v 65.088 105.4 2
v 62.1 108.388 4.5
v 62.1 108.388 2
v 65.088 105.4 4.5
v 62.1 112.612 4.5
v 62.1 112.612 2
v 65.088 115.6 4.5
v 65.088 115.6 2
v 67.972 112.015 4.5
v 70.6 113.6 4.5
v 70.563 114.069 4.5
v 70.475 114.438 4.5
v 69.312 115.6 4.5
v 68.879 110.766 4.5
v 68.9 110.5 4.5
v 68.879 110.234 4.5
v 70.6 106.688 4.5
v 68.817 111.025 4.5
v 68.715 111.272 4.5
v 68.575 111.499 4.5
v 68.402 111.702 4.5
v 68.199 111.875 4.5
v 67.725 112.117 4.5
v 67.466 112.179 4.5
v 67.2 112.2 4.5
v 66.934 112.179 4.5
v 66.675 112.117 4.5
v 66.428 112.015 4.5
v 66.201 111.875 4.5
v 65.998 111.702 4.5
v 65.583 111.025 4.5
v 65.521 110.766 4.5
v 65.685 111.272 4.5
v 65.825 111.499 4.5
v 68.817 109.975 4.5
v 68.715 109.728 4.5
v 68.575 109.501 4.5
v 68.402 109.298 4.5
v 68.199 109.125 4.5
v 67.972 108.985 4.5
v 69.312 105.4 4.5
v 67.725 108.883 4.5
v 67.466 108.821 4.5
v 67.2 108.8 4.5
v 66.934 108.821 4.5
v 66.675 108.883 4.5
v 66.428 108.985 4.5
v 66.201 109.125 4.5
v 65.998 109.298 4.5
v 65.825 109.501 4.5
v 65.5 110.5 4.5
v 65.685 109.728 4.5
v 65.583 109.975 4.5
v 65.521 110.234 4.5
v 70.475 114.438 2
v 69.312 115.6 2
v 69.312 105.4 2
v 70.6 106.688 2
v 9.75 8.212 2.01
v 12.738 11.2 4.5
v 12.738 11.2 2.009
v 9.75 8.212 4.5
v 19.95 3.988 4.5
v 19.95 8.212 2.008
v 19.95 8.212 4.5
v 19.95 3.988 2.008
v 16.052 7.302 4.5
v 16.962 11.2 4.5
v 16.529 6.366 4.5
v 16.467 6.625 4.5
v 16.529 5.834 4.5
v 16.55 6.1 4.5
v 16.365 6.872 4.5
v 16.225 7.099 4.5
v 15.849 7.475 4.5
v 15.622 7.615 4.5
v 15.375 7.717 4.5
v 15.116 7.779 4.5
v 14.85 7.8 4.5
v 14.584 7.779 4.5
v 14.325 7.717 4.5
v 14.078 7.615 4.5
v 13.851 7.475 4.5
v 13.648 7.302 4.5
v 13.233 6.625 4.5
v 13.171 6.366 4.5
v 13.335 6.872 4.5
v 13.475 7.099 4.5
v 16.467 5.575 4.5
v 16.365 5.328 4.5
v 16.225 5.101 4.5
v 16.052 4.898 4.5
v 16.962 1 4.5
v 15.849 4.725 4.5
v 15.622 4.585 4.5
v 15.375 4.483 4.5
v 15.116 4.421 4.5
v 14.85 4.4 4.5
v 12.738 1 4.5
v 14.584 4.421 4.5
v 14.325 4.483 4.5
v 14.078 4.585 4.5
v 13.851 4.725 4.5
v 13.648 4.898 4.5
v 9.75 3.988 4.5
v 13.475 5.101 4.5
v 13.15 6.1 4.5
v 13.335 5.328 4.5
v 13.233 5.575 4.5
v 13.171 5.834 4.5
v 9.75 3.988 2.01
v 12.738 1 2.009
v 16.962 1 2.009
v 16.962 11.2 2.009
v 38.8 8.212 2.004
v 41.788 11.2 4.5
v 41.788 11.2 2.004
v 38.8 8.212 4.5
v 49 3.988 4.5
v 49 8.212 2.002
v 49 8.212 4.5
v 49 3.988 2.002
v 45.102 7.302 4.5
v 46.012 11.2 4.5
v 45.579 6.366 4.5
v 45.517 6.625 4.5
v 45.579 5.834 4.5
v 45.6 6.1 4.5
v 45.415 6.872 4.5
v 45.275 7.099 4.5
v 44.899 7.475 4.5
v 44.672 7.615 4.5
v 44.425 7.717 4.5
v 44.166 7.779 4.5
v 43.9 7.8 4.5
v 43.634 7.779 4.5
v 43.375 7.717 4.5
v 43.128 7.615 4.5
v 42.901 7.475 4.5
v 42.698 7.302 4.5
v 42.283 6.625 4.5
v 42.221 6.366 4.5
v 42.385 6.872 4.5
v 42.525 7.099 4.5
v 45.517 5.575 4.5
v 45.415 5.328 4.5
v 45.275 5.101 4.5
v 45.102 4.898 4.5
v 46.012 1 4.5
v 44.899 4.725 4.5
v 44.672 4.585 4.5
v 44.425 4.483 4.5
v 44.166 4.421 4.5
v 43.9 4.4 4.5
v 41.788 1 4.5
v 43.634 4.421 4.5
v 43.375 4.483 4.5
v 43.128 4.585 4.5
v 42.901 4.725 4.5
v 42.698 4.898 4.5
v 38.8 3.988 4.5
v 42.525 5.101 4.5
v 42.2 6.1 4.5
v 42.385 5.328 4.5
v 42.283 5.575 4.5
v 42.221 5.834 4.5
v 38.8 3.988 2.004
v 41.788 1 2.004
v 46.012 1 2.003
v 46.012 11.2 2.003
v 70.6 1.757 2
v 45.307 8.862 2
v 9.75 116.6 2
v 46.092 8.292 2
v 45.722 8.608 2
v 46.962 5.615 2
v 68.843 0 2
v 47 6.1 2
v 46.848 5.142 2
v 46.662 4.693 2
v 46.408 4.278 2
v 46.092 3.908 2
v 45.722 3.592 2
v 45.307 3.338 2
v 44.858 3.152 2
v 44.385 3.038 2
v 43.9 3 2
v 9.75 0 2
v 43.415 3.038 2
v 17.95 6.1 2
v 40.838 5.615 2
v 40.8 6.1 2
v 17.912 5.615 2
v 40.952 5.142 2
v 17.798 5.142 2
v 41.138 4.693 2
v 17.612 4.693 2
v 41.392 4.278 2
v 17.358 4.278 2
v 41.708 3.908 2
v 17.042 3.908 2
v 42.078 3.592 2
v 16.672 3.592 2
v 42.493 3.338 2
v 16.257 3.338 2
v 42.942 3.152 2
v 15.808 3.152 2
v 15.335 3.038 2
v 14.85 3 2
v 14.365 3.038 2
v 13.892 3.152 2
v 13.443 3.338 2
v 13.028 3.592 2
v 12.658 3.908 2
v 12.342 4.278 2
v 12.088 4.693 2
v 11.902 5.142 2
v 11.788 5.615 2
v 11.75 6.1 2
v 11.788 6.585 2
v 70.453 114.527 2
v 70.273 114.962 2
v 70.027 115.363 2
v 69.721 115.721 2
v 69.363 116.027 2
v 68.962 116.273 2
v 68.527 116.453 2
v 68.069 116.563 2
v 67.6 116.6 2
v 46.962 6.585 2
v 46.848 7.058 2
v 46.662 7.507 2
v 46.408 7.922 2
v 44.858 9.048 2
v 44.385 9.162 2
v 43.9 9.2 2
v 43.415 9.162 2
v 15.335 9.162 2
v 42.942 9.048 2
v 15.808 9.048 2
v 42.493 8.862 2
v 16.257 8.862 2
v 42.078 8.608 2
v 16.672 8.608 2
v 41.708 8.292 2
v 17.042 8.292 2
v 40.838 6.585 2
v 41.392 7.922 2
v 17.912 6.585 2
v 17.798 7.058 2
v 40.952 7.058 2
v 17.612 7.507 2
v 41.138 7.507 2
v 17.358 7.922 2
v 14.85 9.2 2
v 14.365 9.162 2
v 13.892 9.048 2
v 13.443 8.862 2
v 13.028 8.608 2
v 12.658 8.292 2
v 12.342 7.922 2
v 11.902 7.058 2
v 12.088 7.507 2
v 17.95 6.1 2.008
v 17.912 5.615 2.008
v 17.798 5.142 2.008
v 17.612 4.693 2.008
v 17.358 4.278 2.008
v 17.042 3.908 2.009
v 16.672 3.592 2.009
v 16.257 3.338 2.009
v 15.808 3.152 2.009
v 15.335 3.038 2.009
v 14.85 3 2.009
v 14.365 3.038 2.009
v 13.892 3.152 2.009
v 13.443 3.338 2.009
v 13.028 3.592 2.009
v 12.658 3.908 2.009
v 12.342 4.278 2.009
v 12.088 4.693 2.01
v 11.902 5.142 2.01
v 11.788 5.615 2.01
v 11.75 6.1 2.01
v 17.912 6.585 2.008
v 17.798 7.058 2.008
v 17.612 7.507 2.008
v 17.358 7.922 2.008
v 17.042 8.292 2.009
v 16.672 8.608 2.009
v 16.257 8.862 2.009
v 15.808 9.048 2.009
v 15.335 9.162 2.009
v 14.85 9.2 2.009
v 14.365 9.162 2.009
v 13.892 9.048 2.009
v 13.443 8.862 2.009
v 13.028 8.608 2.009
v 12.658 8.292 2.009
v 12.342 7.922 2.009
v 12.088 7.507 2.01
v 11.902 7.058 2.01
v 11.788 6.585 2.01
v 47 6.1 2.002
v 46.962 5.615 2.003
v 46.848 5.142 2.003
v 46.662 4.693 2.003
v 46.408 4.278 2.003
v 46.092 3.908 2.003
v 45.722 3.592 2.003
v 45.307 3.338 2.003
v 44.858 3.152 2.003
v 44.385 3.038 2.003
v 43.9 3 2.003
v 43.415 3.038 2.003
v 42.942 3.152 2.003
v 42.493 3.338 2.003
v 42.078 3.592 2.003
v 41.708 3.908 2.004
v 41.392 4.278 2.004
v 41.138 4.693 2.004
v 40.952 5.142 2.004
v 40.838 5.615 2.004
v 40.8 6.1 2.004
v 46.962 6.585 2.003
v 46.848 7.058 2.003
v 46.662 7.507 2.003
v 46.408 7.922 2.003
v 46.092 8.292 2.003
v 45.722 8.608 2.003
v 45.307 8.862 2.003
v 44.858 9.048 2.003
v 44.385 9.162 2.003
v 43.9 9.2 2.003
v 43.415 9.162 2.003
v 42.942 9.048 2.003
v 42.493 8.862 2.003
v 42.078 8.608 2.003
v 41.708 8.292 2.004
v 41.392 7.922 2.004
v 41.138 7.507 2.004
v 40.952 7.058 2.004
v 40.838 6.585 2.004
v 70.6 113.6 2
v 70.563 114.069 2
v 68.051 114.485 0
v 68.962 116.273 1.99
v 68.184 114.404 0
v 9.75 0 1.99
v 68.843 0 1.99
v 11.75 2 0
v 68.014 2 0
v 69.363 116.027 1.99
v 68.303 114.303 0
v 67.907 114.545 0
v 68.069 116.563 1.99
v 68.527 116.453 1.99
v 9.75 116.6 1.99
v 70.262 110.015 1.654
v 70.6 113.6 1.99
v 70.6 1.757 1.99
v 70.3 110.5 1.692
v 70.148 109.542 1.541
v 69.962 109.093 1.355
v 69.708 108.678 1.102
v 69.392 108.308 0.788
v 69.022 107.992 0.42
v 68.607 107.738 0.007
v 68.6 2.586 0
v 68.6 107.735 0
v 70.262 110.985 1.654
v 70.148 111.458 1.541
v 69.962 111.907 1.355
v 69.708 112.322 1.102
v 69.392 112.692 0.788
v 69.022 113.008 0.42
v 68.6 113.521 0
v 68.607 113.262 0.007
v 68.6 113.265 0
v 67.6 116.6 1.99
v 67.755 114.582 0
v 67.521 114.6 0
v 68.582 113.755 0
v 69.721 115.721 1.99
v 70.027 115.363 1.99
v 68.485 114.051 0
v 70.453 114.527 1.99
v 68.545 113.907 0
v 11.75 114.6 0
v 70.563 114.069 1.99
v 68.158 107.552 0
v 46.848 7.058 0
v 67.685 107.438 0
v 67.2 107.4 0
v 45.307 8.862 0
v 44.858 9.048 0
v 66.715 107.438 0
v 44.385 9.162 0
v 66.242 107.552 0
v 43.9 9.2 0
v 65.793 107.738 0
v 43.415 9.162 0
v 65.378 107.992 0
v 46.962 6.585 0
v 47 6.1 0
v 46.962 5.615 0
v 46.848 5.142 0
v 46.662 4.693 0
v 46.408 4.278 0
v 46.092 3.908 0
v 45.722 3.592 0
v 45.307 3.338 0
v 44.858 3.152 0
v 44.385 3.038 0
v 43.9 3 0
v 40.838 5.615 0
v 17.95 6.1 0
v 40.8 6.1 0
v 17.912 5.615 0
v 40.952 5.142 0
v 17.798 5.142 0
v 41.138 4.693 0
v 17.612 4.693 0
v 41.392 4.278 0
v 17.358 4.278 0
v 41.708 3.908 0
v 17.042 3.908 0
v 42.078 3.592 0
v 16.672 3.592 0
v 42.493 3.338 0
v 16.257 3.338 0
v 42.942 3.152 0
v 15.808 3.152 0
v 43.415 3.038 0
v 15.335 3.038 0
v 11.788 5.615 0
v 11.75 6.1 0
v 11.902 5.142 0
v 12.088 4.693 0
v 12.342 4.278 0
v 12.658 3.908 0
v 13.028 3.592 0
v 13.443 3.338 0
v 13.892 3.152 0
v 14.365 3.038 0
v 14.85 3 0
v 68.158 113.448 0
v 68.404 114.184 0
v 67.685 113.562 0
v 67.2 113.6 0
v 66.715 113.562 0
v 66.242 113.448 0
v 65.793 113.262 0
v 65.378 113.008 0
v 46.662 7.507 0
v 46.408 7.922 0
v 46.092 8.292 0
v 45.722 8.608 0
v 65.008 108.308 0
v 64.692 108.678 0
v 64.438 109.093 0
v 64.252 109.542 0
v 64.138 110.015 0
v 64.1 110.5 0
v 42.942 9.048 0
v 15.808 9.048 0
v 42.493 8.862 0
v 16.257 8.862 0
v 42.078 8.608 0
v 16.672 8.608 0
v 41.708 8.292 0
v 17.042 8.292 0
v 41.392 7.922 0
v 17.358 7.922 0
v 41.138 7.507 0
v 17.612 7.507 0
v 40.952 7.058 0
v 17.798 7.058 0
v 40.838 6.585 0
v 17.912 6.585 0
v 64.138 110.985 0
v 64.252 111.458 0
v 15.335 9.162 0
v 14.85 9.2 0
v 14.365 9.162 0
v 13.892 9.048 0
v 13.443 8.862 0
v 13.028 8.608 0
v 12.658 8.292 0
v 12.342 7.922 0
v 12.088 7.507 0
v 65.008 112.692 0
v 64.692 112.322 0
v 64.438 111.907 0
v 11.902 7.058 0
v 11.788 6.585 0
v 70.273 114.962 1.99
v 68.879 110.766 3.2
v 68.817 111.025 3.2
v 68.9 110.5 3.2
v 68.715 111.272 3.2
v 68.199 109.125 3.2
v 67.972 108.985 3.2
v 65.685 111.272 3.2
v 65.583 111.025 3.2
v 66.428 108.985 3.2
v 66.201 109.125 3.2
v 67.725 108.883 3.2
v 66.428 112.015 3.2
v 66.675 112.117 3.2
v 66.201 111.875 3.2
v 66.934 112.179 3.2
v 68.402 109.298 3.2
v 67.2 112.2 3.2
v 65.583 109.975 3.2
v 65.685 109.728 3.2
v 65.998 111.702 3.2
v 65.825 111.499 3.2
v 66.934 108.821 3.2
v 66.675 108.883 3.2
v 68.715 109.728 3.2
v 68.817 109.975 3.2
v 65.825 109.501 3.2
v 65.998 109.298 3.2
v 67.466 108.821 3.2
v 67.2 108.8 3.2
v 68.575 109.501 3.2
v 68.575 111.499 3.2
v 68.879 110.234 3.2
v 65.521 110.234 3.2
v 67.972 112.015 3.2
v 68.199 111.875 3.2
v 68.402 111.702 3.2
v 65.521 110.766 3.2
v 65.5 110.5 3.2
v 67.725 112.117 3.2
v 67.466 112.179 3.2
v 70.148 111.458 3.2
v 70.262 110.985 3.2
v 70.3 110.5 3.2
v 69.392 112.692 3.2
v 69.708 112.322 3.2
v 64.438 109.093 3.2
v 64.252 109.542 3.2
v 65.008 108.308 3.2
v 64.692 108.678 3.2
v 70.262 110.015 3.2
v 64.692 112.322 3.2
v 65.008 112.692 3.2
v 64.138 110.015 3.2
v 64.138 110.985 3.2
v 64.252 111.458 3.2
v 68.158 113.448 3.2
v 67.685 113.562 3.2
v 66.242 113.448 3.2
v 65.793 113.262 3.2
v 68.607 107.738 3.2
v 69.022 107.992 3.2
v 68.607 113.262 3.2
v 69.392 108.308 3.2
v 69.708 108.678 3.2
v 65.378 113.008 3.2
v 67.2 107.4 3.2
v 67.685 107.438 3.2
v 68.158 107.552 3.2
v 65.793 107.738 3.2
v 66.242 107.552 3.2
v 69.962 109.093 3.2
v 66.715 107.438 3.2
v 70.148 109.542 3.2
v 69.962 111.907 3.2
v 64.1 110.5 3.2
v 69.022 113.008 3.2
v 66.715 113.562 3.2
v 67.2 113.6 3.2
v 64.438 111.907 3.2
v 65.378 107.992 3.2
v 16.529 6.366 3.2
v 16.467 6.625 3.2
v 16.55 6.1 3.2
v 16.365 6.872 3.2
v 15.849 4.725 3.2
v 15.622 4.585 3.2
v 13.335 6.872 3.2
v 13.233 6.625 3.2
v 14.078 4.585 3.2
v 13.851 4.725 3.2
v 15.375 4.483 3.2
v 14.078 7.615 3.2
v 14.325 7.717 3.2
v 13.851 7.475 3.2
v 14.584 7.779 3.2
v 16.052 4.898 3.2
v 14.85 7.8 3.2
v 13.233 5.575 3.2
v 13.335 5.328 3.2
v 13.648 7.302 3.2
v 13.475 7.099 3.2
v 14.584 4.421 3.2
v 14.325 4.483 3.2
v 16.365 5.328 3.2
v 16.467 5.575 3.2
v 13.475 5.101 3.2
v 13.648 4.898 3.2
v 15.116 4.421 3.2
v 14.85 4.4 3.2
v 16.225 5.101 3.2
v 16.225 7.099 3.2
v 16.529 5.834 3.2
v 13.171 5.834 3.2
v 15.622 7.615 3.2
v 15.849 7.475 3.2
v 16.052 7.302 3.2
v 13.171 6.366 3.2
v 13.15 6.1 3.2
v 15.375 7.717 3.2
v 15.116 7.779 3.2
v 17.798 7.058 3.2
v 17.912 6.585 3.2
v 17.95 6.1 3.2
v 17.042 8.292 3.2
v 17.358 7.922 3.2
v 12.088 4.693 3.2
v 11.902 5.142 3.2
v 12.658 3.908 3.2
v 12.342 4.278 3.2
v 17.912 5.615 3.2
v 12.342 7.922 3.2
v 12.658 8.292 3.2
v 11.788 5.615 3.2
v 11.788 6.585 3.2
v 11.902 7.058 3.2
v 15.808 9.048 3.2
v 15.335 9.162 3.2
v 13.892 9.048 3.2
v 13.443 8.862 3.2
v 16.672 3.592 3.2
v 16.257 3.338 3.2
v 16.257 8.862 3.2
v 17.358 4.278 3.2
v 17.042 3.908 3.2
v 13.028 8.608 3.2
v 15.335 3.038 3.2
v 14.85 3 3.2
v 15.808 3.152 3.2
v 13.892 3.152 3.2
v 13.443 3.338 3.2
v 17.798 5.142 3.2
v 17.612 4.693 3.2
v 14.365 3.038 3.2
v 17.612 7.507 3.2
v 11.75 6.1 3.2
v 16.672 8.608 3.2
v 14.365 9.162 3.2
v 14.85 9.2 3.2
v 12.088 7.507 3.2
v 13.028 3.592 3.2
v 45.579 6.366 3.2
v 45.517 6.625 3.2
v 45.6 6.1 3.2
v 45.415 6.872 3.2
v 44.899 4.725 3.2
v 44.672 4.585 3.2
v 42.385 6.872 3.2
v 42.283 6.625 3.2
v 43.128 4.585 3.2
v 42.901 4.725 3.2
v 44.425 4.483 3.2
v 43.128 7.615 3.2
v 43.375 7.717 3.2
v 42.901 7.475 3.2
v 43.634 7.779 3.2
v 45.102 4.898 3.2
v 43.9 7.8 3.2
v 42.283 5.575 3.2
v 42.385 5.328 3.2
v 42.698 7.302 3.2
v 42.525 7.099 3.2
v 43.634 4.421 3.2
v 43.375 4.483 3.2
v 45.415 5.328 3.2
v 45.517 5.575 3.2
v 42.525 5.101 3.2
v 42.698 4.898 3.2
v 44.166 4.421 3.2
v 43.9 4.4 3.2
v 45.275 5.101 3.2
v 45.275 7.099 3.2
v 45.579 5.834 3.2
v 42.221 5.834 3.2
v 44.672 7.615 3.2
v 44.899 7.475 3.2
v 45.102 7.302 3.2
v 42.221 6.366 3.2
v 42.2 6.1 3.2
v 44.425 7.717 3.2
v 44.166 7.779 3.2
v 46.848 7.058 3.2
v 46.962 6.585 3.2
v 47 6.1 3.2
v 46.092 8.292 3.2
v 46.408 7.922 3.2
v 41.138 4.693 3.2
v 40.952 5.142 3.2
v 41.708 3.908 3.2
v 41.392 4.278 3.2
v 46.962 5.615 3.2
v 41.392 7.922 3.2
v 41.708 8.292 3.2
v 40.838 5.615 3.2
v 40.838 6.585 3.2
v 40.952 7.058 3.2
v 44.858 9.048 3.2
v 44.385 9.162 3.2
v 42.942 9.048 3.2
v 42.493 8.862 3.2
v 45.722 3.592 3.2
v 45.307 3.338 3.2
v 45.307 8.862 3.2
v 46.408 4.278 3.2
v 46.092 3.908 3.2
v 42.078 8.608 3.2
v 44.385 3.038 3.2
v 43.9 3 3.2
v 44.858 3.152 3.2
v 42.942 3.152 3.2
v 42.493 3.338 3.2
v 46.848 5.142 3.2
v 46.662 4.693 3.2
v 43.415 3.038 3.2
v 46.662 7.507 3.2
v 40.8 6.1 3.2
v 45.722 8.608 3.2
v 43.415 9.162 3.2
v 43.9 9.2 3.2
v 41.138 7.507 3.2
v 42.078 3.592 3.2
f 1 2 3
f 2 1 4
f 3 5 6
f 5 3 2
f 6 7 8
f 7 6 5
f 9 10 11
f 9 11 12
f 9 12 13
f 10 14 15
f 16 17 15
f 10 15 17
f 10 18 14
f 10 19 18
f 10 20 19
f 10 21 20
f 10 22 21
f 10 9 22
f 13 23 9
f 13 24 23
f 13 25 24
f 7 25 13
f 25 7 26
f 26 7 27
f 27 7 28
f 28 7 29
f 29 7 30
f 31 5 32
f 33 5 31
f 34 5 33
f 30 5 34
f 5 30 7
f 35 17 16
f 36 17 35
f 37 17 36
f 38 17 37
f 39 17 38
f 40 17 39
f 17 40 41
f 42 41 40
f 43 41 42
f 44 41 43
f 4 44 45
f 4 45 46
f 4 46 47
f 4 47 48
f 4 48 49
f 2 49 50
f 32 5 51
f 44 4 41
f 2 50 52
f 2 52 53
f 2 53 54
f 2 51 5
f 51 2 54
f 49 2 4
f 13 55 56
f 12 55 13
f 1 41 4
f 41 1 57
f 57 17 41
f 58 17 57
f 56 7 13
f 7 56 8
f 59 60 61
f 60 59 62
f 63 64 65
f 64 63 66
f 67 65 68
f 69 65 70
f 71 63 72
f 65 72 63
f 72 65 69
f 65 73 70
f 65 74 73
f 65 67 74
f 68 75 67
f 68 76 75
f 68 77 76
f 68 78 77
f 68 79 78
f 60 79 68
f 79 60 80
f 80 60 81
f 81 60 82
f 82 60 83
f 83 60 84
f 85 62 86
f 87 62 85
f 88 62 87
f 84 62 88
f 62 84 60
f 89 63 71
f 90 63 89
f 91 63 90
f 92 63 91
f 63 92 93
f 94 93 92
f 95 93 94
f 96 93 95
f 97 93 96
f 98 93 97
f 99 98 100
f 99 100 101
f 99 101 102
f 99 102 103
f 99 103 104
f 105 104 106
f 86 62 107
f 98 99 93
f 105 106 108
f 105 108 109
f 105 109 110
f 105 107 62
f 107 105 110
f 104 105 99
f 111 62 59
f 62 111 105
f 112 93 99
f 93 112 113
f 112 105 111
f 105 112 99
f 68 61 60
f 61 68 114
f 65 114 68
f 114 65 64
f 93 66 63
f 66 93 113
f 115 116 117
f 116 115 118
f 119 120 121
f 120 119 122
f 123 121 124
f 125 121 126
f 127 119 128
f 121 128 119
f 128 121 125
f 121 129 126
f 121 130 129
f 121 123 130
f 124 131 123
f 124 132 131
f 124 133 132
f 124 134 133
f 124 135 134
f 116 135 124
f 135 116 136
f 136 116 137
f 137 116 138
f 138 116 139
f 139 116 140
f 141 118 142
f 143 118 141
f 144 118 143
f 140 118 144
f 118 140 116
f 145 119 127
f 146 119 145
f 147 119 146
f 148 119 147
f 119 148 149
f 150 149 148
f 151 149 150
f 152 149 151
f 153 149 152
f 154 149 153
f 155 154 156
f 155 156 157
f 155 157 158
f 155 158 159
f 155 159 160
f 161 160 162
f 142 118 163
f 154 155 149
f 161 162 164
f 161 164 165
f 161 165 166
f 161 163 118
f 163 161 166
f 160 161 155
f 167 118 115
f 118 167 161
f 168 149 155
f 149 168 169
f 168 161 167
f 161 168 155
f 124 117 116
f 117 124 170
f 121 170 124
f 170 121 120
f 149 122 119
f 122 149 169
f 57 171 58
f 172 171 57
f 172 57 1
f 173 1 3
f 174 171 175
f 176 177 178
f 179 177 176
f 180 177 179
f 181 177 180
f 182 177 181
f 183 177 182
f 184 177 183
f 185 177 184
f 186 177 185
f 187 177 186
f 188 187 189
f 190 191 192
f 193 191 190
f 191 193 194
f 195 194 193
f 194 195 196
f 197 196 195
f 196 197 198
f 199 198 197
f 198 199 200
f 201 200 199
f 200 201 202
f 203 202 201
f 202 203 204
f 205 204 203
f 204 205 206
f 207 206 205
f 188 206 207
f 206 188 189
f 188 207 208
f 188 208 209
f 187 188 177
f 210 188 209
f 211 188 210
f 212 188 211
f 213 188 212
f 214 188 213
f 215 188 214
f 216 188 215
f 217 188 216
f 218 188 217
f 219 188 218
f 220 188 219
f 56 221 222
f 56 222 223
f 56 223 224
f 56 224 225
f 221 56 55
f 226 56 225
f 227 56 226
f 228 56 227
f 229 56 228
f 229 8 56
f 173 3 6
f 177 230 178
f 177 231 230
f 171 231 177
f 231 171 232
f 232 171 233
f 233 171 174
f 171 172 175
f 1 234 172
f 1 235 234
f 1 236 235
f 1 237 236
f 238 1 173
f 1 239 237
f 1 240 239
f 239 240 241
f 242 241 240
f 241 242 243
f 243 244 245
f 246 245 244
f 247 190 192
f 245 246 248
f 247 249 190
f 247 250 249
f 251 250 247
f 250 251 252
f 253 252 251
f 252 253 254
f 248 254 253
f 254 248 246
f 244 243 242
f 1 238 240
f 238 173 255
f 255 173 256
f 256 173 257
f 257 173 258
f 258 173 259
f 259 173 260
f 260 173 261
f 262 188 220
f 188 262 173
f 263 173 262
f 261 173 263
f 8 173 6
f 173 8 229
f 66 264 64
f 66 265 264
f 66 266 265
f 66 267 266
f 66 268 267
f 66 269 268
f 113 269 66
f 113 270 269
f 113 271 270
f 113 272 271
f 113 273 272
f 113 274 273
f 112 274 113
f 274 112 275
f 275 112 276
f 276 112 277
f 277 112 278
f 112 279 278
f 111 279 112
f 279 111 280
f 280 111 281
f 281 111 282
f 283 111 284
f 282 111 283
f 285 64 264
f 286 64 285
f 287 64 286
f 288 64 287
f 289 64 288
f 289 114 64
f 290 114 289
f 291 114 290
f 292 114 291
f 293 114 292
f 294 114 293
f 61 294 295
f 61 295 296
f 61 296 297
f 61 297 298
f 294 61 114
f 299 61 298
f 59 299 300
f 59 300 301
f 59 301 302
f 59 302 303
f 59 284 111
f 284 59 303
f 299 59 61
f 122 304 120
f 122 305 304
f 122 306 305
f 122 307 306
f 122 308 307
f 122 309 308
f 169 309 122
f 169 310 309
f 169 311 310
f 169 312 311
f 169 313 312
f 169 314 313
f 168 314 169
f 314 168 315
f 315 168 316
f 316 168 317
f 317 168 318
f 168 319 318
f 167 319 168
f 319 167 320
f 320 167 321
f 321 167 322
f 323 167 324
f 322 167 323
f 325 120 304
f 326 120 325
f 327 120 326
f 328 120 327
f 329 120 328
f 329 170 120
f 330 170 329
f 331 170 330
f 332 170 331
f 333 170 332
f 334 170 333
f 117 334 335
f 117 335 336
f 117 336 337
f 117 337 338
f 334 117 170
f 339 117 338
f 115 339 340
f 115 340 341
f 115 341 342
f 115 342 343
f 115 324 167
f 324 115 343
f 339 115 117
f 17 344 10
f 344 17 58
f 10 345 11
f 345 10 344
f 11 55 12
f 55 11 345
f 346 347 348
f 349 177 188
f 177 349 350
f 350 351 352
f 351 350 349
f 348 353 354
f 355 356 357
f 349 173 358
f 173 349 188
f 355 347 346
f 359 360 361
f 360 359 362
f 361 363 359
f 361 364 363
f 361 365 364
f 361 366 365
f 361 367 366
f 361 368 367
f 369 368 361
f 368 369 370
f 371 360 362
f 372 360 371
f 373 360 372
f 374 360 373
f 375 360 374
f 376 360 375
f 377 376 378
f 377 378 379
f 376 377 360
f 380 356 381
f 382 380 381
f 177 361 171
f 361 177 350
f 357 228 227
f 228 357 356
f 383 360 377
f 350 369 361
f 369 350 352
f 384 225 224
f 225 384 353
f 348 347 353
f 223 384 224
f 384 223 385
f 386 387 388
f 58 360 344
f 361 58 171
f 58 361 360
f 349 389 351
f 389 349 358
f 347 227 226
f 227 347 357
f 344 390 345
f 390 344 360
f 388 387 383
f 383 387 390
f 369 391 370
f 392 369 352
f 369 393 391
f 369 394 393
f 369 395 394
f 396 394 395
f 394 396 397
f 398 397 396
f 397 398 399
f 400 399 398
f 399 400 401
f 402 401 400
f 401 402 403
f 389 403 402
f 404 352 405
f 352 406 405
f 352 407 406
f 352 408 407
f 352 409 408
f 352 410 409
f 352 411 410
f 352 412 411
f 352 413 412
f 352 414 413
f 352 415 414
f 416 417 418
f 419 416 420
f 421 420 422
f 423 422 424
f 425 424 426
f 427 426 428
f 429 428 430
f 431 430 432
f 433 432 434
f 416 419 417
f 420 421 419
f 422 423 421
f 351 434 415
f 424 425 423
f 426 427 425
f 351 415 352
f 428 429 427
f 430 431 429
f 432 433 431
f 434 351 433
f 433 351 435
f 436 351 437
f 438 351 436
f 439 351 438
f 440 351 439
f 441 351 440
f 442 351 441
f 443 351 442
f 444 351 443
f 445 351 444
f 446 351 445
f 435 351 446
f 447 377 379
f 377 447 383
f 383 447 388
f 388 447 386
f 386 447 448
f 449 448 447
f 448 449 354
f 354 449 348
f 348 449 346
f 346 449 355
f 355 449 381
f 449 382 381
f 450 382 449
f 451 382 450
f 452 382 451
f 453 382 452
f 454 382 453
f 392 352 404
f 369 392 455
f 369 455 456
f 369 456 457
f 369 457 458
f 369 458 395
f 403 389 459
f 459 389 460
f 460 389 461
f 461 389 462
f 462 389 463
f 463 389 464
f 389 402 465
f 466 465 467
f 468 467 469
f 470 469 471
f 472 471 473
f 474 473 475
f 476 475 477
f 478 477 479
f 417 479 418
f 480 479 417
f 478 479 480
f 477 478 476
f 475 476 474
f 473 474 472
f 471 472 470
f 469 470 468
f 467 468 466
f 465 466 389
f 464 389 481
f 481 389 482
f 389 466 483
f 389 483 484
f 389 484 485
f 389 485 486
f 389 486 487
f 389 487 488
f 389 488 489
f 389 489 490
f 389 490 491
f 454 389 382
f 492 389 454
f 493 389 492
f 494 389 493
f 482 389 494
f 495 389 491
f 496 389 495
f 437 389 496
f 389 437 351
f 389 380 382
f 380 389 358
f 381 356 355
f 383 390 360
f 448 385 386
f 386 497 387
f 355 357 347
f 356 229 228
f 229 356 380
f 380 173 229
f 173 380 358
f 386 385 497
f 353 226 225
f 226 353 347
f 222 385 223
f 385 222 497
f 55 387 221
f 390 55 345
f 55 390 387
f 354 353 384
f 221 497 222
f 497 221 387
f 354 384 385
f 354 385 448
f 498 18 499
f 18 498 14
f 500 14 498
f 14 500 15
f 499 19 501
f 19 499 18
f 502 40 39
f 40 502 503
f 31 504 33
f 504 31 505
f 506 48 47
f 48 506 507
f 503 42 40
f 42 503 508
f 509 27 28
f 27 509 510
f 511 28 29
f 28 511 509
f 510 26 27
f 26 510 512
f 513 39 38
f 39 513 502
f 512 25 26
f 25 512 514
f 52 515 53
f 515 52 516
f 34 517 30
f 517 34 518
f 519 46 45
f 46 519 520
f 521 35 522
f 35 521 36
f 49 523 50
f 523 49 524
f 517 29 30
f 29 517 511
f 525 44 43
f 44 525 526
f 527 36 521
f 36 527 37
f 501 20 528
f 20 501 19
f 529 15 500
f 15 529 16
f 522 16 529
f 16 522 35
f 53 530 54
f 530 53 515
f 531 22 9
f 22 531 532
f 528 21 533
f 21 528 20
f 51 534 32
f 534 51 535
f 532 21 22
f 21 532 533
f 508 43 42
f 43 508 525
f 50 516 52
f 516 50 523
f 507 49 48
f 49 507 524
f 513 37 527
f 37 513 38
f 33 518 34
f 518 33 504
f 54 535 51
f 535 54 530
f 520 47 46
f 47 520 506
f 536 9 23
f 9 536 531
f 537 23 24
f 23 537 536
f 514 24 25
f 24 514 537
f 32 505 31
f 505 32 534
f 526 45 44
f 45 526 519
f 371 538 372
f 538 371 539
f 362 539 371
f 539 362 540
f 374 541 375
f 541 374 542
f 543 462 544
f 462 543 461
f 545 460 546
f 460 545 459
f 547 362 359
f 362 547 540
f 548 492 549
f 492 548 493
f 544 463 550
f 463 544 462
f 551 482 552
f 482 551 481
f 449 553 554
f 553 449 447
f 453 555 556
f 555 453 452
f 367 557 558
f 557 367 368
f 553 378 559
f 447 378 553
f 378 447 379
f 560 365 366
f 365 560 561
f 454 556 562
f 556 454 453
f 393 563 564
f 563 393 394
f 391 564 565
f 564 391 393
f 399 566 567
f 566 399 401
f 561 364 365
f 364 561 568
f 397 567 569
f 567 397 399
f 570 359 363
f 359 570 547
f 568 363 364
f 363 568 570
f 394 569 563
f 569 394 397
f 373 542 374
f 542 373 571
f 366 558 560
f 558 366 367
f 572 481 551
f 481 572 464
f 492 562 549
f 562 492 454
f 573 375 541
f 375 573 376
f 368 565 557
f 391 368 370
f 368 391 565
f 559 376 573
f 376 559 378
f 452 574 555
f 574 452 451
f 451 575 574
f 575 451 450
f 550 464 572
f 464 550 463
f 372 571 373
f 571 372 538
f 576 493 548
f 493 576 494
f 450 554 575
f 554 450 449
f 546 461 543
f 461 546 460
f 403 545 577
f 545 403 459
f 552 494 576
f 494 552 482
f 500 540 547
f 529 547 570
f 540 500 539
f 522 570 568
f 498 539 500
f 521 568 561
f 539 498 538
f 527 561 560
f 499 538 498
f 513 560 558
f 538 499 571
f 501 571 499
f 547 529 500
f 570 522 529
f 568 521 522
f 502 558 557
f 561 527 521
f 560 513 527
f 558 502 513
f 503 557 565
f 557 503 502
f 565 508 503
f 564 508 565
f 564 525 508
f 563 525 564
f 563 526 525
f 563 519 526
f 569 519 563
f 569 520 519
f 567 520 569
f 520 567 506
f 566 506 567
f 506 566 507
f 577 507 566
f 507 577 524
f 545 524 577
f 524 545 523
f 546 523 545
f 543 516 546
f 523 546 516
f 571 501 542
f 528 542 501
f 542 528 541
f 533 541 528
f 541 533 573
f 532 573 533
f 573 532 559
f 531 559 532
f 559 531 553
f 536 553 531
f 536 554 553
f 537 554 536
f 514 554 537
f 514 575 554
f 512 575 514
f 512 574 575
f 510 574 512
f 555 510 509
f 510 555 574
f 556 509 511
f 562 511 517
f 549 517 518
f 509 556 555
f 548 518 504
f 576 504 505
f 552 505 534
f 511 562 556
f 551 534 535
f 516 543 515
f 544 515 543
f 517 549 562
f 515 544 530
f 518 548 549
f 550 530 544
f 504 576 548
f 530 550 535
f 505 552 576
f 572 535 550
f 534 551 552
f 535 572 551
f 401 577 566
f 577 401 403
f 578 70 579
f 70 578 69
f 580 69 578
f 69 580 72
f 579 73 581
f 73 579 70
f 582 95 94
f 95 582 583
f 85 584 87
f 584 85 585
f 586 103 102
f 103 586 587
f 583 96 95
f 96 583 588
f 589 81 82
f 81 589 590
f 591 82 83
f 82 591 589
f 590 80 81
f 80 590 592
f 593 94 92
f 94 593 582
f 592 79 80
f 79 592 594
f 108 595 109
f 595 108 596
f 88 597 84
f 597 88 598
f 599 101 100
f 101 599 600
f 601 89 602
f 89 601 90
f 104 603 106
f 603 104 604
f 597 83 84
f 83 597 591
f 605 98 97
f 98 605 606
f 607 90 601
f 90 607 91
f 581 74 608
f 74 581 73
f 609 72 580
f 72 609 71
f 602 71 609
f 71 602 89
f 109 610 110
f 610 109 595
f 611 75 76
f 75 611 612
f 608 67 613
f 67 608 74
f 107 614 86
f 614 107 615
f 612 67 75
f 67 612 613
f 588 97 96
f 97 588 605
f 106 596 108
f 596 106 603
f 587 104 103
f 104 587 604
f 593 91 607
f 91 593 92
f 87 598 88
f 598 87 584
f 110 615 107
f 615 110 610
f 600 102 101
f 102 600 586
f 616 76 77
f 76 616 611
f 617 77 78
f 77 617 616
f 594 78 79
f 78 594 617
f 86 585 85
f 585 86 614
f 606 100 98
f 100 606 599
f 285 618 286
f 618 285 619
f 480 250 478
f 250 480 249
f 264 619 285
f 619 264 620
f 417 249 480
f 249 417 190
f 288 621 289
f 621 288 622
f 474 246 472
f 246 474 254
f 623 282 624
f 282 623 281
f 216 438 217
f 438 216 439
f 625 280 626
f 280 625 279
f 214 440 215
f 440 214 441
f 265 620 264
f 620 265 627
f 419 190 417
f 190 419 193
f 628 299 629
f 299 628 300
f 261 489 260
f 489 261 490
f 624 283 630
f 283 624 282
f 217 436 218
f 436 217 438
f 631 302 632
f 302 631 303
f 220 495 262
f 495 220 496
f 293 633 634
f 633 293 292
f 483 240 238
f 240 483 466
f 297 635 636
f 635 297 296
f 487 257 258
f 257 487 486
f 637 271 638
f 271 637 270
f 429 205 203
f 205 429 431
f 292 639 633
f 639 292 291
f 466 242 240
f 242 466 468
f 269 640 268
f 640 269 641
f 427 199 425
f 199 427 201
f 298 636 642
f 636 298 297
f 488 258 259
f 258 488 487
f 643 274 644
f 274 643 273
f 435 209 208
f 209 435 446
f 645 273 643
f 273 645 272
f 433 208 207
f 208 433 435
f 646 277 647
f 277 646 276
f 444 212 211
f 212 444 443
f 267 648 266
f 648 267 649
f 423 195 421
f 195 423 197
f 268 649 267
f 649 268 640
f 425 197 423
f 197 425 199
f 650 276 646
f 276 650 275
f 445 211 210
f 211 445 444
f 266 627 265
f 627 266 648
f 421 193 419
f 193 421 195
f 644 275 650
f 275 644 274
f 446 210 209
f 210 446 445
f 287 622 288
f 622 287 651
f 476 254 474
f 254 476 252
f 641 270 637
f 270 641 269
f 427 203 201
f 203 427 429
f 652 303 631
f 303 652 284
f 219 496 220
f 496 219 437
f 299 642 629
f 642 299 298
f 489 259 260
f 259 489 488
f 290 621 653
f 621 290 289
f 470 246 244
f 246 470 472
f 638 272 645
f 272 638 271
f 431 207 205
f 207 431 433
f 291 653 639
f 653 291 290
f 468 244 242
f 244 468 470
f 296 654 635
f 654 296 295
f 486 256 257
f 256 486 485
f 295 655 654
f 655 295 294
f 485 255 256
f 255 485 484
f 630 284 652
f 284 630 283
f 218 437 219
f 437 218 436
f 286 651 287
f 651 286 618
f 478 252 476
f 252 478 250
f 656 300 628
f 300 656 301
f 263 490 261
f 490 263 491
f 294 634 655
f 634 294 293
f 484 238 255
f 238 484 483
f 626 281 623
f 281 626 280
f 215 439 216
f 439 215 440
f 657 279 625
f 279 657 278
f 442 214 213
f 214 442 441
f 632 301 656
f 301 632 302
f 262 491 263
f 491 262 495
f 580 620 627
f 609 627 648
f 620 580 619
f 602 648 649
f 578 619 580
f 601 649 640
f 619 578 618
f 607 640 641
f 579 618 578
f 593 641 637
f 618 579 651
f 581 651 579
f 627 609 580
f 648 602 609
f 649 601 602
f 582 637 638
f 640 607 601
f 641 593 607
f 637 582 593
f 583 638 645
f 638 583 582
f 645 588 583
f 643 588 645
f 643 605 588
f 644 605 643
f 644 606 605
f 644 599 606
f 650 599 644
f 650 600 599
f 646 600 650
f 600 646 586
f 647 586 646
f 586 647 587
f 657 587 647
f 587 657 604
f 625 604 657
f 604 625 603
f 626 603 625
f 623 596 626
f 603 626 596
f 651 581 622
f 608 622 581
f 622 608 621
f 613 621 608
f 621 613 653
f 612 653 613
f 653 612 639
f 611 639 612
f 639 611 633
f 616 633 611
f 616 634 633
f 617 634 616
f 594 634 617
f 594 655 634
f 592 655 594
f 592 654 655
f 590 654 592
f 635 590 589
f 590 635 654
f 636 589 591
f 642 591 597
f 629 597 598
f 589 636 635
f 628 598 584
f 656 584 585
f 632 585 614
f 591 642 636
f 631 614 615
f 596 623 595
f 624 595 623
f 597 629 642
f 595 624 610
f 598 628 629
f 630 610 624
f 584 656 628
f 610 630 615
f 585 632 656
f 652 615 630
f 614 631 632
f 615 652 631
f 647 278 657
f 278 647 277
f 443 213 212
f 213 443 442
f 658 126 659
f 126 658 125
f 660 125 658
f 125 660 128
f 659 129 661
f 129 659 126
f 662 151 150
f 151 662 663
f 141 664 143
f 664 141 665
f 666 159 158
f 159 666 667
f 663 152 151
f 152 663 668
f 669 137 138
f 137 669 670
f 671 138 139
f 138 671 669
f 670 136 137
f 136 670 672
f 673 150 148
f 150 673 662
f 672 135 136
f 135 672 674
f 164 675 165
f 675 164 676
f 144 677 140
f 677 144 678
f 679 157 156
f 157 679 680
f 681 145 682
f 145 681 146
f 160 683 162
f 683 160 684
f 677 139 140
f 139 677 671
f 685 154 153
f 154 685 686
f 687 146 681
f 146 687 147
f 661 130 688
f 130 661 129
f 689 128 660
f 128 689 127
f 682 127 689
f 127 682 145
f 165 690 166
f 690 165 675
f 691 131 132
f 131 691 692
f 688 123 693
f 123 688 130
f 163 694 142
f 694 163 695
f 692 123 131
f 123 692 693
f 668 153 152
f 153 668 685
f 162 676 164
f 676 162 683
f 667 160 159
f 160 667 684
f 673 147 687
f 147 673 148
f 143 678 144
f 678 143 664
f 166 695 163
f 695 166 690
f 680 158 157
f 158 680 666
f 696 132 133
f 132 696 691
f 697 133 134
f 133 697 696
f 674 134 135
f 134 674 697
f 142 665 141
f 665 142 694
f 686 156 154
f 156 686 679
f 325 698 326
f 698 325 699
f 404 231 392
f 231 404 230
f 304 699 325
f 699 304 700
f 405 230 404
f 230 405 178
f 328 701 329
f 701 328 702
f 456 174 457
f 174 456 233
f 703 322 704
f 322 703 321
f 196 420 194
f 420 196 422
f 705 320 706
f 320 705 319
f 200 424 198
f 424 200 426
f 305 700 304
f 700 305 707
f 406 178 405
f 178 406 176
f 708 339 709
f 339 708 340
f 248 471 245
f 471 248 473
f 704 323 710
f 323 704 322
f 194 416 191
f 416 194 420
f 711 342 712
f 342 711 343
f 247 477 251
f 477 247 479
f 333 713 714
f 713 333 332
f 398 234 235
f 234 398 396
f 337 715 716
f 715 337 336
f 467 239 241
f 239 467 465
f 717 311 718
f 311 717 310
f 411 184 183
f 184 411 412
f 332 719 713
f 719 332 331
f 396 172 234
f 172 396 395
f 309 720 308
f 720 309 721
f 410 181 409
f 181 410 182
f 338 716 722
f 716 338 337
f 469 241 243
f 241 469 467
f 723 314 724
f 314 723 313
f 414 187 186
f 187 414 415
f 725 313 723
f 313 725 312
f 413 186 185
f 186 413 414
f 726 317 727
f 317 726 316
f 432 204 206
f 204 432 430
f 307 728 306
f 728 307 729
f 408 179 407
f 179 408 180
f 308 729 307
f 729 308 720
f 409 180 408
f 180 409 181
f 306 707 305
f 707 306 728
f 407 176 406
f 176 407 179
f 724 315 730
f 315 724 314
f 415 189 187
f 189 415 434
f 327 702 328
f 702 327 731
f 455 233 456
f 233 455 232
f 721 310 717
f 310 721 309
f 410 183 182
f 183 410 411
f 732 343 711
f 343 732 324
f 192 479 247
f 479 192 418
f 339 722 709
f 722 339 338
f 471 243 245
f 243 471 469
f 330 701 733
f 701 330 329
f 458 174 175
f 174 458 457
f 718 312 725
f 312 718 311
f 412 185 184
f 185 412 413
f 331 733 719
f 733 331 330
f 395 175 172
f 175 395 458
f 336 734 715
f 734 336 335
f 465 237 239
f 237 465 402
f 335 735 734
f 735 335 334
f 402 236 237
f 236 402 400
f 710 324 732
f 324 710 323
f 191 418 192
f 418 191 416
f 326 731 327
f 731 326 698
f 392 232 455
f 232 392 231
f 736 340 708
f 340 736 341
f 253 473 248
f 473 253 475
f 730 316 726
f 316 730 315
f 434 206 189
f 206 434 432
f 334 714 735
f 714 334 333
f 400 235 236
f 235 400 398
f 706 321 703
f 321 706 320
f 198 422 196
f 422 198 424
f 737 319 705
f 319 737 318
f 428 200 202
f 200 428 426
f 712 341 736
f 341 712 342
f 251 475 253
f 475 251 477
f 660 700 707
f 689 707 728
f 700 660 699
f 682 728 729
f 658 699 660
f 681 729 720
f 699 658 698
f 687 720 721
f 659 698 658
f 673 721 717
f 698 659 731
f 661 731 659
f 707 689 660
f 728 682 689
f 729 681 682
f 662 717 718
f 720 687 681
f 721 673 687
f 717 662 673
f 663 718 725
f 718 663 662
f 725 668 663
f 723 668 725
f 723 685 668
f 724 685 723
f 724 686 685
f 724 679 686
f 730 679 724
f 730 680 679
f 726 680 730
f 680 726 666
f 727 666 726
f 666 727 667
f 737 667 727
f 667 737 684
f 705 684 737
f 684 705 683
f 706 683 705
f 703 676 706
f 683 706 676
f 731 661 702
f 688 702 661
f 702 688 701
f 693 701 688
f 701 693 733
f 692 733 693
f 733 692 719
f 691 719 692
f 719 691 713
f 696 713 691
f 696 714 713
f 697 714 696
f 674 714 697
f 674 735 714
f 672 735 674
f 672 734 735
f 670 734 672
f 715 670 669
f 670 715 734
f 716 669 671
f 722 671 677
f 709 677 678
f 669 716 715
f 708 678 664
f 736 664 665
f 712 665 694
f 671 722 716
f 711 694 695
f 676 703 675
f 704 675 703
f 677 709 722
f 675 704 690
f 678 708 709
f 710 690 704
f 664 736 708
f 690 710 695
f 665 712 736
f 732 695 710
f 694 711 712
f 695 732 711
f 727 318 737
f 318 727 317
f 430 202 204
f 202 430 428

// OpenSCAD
include <../lib/kobo-meshcore-case-lib.scad>;
$fn = 40;
cover();
